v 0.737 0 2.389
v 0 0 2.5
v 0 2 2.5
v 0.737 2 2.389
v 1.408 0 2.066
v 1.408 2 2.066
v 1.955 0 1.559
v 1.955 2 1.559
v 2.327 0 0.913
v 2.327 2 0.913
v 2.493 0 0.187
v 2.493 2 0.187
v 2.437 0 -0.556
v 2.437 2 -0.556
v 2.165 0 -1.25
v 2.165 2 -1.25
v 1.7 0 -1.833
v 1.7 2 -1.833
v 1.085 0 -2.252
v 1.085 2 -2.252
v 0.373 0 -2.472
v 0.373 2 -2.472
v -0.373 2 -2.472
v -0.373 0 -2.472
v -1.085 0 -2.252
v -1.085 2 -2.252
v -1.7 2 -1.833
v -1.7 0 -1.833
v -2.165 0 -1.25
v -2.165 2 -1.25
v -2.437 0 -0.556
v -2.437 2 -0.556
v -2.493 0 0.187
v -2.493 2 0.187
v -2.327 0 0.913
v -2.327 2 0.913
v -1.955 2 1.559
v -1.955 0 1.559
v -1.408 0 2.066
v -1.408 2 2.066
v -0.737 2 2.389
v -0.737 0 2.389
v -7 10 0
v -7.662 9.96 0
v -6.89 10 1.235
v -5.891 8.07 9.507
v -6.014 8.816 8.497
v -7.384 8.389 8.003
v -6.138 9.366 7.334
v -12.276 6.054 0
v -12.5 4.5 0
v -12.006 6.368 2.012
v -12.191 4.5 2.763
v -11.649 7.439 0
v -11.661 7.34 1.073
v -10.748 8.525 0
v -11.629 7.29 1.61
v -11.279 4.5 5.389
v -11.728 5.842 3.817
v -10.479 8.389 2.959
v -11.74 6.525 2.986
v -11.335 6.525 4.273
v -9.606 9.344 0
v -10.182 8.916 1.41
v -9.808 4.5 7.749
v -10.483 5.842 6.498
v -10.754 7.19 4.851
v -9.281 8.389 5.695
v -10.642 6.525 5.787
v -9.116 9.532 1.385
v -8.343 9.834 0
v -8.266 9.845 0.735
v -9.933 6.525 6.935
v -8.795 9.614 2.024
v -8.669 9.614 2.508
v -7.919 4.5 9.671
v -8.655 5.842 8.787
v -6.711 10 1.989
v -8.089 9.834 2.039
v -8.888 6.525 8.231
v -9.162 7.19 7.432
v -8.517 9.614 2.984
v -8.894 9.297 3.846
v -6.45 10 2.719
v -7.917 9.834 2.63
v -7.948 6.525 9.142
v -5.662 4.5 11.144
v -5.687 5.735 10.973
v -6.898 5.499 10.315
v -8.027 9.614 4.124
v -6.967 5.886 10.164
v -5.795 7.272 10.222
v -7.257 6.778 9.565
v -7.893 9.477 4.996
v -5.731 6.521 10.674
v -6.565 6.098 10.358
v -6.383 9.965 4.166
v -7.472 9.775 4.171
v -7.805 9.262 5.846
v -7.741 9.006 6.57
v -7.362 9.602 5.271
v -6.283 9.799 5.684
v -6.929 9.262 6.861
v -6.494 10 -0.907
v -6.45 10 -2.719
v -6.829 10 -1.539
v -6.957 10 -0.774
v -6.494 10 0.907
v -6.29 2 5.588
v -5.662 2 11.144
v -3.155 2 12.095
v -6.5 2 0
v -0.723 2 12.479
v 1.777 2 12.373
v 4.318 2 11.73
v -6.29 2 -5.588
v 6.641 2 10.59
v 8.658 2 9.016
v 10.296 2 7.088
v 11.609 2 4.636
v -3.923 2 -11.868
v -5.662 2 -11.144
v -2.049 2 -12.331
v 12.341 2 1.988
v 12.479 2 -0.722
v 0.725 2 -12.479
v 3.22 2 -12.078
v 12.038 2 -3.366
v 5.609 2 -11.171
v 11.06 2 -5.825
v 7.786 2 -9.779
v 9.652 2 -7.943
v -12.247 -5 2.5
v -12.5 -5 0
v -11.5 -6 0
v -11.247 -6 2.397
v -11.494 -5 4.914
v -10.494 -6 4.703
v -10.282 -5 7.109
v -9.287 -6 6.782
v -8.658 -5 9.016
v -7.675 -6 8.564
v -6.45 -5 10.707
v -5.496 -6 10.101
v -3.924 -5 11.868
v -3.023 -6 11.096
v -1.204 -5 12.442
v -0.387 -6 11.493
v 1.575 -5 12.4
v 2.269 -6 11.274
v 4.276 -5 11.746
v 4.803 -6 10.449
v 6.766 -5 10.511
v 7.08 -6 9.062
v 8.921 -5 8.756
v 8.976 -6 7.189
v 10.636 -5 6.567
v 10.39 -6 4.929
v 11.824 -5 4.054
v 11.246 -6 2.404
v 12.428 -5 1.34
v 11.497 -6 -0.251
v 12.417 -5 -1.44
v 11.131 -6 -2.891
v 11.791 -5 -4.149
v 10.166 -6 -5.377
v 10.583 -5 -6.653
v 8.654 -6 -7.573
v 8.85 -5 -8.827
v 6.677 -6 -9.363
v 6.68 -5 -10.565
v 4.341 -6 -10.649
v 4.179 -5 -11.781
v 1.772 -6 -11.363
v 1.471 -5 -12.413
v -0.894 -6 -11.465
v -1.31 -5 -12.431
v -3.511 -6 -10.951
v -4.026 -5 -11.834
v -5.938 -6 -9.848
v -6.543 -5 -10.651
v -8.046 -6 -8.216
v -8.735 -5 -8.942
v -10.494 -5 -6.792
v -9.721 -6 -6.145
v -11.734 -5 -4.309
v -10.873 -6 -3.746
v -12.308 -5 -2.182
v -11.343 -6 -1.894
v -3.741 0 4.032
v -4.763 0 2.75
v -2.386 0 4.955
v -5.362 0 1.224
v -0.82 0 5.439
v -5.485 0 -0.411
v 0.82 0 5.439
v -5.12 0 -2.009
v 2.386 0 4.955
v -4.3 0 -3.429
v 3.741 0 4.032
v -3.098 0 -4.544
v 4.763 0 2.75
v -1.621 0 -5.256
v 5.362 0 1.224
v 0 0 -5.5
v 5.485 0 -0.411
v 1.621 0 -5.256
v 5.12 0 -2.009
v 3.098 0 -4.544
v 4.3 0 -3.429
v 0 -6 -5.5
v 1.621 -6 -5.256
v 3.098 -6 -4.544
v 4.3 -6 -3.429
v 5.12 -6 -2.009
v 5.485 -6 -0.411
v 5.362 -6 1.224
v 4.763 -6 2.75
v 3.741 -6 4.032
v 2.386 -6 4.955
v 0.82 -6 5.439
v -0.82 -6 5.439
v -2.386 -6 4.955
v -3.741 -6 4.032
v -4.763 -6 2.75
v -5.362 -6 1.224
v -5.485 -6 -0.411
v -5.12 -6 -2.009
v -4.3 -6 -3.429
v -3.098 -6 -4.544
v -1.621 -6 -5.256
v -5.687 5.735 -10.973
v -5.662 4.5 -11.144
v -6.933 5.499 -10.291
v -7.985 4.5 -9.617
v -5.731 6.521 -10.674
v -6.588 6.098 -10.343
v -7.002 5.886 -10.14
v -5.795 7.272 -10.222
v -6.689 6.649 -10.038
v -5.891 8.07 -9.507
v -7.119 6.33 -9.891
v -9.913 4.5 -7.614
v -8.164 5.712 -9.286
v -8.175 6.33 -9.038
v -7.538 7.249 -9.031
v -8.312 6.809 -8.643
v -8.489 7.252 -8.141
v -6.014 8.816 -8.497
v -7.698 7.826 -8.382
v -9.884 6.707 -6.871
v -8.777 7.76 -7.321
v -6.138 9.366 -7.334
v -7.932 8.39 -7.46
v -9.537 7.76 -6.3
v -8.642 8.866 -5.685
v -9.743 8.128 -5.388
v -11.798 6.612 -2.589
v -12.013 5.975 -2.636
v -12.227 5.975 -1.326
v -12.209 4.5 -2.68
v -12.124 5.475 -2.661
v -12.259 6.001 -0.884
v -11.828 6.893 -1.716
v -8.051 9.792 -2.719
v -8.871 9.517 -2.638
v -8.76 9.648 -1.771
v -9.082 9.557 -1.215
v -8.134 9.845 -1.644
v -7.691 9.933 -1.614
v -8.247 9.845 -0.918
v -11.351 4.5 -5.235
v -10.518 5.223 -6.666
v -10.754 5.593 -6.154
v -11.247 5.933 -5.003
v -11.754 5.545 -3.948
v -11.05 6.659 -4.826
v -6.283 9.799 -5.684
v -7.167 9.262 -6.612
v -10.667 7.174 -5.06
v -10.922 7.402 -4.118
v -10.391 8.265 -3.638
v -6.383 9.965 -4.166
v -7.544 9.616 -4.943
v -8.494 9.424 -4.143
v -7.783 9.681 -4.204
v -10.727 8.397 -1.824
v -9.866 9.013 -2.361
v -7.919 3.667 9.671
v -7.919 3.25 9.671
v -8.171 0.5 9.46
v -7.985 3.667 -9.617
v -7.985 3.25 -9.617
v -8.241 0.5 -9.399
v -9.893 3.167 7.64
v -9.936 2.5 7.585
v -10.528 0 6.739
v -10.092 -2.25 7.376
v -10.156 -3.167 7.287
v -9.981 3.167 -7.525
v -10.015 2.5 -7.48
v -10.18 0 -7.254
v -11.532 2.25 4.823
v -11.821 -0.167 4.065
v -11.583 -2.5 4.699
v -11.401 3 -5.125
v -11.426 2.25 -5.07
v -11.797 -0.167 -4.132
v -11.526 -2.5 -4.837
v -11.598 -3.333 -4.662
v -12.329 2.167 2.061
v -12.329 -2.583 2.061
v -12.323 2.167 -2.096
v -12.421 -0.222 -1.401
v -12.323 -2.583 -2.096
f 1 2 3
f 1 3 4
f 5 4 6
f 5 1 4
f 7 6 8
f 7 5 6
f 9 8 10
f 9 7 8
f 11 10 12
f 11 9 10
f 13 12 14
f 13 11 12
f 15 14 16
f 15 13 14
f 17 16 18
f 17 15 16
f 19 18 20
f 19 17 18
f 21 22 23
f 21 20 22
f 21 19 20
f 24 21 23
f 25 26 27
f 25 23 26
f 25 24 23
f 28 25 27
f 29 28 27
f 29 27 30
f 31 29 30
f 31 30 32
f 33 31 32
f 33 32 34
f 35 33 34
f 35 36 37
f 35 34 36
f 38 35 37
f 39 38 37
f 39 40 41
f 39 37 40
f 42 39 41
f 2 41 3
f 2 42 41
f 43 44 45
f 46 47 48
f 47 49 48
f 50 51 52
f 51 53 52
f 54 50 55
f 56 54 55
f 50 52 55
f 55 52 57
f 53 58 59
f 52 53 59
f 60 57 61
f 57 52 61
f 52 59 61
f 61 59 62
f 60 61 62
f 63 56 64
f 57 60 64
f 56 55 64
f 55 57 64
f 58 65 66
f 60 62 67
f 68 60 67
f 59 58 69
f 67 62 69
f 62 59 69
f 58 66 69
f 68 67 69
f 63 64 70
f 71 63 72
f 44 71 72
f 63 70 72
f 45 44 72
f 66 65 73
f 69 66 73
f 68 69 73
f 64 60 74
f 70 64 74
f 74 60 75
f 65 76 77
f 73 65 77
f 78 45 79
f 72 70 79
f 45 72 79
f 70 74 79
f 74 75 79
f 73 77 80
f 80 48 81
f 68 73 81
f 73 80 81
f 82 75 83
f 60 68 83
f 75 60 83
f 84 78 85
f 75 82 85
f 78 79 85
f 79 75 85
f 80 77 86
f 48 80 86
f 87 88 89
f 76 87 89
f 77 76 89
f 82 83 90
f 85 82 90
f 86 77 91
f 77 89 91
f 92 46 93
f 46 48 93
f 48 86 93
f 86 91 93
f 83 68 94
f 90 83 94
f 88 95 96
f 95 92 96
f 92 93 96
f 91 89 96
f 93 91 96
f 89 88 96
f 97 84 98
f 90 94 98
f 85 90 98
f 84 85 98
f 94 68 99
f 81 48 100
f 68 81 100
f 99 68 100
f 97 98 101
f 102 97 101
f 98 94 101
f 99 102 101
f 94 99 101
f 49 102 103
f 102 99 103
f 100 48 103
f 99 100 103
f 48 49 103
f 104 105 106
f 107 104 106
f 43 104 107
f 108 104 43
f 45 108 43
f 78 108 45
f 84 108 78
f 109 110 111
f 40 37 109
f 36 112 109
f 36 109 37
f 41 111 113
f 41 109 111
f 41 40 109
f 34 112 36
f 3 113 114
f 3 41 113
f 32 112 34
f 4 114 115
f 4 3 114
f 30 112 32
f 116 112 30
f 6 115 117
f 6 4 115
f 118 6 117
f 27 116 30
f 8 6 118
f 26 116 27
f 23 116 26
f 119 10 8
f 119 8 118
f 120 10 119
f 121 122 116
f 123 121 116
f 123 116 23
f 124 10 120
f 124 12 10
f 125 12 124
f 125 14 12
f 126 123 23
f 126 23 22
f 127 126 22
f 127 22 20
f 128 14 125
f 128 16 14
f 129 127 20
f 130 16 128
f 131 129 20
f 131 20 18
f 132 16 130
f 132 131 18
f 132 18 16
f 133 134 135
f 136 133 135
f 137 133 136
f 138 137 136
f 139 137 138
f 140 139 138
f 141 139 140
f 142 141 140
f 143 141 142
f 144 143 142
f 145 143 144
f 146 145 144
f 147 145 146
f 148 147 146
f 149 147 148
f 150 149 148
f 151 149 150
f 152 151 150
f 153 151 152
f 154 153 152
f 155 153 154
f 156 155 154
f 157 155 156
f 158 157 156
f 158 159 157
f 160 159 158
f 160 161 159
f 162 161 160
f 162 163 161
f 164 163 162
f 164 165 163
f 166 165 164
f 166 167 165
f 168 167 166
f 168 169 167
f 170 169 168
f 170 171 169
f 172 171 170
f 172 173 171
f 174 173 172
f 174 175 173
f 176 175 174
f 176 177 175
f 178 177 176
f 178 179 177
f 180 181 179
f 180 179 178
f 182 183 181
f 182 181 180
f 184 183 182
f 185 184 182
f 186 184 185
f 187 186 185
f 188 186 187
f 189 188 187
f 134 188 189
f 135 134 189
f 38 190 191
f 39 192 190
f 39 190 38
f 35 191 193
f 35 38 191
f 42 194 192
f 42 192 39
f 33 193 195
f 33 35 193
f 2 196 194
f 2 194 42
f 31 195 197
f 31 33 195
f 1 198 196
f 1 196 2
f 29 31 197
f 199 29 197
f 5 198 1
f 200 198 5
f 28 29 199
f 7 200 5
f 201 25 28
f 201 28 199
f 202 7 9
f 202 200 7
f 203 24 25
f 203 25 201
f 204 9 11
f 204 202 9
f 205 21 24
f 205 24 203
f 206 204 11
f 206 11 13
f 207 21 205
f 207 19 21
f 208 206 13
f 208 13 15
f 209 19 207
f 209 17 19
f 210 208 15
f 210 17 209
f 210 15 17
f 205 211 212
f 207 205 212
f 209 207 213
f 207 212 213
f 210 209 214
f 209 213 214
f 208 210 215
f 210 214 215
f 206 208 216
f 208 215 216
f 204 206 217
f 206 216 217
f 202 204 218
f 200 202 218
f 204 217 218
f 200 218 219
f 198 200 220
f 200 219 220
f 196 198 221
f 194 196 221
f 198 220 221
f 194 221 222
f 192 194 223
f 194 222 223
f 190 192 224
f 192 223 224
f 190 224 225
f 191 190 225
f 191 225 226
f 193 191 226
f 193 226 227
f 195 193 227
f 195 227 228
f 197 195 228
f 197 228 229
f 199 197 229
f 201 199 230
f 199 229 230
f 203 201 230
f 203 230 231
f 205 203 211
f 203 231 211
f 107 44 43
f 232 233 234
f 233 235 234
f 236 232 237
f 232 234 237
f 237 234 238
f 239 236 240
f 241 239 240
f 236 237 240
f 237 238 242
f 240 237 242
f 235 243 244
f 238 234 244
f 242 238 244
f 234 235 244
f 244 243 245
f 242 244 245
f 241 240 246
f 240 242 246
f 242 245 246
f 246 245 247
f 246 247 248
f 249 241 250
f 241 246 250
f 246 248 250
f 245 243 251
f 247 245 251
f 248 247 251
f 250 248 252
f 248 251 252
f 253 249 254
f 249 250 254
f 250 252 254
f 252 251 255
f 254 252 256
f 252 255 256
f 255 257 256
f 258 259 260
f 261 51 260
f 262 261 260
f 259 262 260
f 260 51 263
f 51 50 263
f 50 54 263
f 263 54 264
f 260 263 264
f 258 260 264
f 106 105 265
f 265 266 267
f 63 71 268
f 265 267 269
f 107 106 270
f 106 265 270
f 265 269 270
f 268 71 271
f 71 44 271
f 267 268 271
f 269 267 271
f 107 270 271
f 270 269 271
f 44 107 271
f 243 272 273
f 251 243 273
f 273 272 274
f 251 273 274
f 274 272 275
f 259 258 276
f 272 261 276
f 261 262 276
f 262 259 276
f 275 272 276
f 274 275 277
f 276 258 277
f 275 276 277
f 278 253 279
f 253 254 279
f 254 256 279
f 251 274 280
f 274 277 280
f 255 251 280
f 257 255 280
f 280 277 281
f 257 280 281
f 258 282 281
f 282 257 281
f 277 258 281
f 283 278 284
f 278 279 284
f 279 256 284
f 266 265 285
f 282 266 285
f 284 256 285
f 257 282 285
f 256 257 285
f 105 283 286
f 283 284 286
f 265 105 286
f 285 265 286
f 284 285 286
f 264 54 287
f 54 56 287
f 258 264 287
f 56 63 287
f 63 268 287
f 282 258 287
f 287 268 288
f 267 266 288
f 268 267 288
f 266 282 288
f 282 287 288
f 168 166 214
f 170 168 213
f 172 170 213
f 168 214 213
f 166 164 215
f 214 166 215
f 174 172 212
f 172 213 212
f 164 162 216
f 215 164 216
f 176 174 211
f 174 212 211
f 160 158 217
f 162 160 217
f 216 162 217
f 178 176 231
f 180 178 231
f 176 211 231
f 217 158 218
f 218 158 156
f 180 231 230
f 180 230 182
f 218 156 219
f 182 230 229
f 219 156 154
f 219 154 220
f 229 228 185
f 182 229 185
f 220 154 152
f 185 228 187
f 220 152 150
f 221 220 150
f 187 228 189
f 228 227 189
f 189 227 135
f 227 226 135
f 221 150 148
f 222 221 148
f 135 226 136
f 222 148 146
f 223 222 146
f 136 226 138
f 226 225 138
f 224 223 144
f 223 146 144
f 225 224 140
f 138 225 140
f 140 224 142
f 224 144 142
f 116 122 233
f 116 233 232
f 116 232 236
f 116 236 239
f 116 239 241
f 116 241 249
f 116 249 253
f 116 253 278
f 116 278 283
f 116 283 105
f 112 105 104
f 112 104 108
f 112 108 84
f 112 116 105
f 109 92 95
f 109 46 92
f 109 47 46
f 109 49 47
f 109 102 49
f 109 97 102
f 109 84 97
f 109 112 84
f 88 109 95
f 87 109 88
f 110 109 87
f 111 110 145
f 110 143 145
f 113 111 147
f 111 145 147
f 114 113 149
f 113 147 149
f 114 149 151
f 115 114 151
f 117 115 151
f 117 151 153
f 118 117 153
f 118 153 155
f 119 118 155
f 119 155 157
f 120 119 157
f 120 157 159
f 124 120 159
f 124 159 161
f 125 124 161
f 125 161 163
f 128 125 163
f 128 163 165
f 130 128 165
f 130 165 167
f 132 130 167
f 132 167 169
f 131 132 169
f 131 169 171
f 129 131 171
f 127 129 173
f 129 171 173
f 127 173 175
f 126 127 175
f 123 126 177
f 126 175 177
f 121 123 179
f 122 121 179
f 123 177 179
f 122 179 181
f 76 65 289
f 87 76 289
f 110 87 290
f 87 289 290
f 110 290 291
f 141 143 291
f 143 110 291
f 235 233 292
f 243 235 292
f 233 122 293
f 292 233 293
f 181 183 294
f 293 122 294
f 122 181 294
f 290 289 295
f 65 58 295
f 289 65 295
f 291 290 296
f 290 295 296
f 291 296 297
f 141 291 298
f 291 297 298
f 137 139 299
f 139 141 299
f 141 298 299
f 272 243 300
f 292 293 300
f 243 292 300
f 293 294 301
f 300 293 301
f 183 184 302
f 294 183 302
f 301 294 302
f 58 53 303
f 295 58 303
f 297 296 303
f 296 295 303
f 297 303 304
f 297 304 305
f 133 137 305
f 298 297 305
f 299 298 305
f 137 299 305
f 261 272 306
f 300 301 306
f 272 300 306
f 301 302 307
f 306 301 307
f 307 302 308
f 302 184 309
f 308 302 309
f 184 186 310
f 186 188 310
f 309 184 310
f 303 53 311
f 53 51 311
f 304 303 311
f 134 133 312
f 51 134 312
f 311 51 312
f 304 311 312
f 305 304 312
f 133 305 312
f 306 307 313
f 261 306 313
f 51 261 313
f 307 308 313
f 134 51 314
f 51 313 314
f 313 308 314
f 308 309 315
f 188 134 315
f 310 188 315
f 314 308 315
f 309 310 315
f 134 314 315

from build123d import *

# Parameters (mm, degrees)
BOSS_EXTRUDE1_DEPTH      = 10
BOSS_EXTRUDE1_DEPTH_BACK = 6
SKETCH1_RX               = 12.5
SKETCH1_RY               = 12.5
SKETCH1_R                = 2.5
CUT_EXTRUDE1_START       = -8
CUT_EXTRUDE1_OUTLINE_R   = 2.5
CUT_EXTRUDE1_DEPTH       = 8
FILLET1_R                = 5.5
SKETCH3_R                = 5.5
SKETCH3_R_2              = 2.5
CUT_EXTRUDE2_DEPTH       = 6
CHAMFER1_SIZE            = 1


# Read off the part's stored shape, not the designer's step: Cut-Extrude1
with BuildPart() as part:
    # Sketch1 → Boss-Extrude1 (new, two sides: drawn at the far end of the back side and taken through both)
    with BuildSketch(Plane(origin=(0, 0, 0), x_dir=(1, 0, 0), z_dir=(0, 1, 0)).offset(-BOSS_EXTRUDE1_DEPTH_BACK)):
        with Locations(Location((0, 0), (0, 0, -180))):
            Ellipse(SKETCH1_RX, SKETCH1_RY)
        with Locations(Location((0, 0, 0), (0, 0, 270))):
            Circle(SKETCH1_R, mode=Mode.SUBTRACT)
    extrude(amount=BOSS_EXTRUDE1_DEPTH + BOSS_EXTRUDE1_DEPTH_BACK)

    # Cut-Extrude1 outline → Cut-Extrude1 (cut)
    with BuildSketch(Plane(origin=(0, 10, 0), x_dir=(1, 0, 0), z_dir=(0, 1, 0)).offset(CUT_EXTRUDE1_START)):
        with BuildLine():
            add(Edge.make_bspline(
                [(-5.661764706, -11.144255041), (-4.512657491, -11.728051324), (-3.332619083, -12.141253277), (-2.167018805, -12.389388515), (-1.051861299, -12.5), (4.330127019, -12.5), (10.825317547, -10.416666667), (14.43375673, -4.166666667), (12.990381057, 2.5), (9.293805319, 8.902656992), (6.609319122, 11.644393421), (2.468408622, 13.548505079), (-2.218139666, 12.893765855), (-5.661764706, 11.144255041)],
                knots=[5.774421212, 5.774421212, 5.774421212, 5.774421212, 5.774421212, 5.774421212, 6.283185307, 6.283185307, 6.283185307, 6.283185307, 8.37758041, 8.37758041, 8.37758041, 8.37758041, 9.859103559, 9.859103559, 9.859103559, 9.859103559, 9.859103559, 9.859103559], degree=5, weights=[1, 1, 1.000149309, 1.000268817, 1, 1, 0.9, 0.9, 1, 1, 0.983486663, 0.969415241, 1, 1]))
            ThreePointArc((-5.661764706, 11.144255041), (-6.5, 0), (-5.661764706, -11.144255041))
        make_face()
        Circle(CUT_EXTRUDE1_OUTLINE_R, mode=Mode.SUBTRACT)
    extrude(amount=CUT_EXTRUDE1_DEPTH, mode=Mode.SUBTRACT)

    # Fillet1
    fillet1_edges = [part.edges().sort_by_distance(p)[0] for p in [
        (-10.6541555, 10, 6.537504921),
    ]]
    fillet(fillet1_edges, radius=FILLET1_R)

    # Sketch3 → Cut-Extrude2 (cut)
    with BuildSketch(Plane.XZ.offset(6)):
        with Locations(Location((0, 0, 0), (0, 0, 270))):
            Circle(SKETCH3_R)
        with Locations(Location((0, 0, 0), (0, 0, 90))):
            Circle(SKETCH3_R_2, mode=Mode.SUBTRACT)
    extrude(amount=-CUT_EXTRUDE2_DEPTH, mode=Mode.SUBTRACT)

    # Chamfer1
    chamfer1_edges = [part.edges().sort_by_distance(p)[0] for p in [
        (12.5, -6, 0),
    ]]
    chamfer(chamfer1_edges, length=CHAMFER1_SIZE)


solid = part.part
